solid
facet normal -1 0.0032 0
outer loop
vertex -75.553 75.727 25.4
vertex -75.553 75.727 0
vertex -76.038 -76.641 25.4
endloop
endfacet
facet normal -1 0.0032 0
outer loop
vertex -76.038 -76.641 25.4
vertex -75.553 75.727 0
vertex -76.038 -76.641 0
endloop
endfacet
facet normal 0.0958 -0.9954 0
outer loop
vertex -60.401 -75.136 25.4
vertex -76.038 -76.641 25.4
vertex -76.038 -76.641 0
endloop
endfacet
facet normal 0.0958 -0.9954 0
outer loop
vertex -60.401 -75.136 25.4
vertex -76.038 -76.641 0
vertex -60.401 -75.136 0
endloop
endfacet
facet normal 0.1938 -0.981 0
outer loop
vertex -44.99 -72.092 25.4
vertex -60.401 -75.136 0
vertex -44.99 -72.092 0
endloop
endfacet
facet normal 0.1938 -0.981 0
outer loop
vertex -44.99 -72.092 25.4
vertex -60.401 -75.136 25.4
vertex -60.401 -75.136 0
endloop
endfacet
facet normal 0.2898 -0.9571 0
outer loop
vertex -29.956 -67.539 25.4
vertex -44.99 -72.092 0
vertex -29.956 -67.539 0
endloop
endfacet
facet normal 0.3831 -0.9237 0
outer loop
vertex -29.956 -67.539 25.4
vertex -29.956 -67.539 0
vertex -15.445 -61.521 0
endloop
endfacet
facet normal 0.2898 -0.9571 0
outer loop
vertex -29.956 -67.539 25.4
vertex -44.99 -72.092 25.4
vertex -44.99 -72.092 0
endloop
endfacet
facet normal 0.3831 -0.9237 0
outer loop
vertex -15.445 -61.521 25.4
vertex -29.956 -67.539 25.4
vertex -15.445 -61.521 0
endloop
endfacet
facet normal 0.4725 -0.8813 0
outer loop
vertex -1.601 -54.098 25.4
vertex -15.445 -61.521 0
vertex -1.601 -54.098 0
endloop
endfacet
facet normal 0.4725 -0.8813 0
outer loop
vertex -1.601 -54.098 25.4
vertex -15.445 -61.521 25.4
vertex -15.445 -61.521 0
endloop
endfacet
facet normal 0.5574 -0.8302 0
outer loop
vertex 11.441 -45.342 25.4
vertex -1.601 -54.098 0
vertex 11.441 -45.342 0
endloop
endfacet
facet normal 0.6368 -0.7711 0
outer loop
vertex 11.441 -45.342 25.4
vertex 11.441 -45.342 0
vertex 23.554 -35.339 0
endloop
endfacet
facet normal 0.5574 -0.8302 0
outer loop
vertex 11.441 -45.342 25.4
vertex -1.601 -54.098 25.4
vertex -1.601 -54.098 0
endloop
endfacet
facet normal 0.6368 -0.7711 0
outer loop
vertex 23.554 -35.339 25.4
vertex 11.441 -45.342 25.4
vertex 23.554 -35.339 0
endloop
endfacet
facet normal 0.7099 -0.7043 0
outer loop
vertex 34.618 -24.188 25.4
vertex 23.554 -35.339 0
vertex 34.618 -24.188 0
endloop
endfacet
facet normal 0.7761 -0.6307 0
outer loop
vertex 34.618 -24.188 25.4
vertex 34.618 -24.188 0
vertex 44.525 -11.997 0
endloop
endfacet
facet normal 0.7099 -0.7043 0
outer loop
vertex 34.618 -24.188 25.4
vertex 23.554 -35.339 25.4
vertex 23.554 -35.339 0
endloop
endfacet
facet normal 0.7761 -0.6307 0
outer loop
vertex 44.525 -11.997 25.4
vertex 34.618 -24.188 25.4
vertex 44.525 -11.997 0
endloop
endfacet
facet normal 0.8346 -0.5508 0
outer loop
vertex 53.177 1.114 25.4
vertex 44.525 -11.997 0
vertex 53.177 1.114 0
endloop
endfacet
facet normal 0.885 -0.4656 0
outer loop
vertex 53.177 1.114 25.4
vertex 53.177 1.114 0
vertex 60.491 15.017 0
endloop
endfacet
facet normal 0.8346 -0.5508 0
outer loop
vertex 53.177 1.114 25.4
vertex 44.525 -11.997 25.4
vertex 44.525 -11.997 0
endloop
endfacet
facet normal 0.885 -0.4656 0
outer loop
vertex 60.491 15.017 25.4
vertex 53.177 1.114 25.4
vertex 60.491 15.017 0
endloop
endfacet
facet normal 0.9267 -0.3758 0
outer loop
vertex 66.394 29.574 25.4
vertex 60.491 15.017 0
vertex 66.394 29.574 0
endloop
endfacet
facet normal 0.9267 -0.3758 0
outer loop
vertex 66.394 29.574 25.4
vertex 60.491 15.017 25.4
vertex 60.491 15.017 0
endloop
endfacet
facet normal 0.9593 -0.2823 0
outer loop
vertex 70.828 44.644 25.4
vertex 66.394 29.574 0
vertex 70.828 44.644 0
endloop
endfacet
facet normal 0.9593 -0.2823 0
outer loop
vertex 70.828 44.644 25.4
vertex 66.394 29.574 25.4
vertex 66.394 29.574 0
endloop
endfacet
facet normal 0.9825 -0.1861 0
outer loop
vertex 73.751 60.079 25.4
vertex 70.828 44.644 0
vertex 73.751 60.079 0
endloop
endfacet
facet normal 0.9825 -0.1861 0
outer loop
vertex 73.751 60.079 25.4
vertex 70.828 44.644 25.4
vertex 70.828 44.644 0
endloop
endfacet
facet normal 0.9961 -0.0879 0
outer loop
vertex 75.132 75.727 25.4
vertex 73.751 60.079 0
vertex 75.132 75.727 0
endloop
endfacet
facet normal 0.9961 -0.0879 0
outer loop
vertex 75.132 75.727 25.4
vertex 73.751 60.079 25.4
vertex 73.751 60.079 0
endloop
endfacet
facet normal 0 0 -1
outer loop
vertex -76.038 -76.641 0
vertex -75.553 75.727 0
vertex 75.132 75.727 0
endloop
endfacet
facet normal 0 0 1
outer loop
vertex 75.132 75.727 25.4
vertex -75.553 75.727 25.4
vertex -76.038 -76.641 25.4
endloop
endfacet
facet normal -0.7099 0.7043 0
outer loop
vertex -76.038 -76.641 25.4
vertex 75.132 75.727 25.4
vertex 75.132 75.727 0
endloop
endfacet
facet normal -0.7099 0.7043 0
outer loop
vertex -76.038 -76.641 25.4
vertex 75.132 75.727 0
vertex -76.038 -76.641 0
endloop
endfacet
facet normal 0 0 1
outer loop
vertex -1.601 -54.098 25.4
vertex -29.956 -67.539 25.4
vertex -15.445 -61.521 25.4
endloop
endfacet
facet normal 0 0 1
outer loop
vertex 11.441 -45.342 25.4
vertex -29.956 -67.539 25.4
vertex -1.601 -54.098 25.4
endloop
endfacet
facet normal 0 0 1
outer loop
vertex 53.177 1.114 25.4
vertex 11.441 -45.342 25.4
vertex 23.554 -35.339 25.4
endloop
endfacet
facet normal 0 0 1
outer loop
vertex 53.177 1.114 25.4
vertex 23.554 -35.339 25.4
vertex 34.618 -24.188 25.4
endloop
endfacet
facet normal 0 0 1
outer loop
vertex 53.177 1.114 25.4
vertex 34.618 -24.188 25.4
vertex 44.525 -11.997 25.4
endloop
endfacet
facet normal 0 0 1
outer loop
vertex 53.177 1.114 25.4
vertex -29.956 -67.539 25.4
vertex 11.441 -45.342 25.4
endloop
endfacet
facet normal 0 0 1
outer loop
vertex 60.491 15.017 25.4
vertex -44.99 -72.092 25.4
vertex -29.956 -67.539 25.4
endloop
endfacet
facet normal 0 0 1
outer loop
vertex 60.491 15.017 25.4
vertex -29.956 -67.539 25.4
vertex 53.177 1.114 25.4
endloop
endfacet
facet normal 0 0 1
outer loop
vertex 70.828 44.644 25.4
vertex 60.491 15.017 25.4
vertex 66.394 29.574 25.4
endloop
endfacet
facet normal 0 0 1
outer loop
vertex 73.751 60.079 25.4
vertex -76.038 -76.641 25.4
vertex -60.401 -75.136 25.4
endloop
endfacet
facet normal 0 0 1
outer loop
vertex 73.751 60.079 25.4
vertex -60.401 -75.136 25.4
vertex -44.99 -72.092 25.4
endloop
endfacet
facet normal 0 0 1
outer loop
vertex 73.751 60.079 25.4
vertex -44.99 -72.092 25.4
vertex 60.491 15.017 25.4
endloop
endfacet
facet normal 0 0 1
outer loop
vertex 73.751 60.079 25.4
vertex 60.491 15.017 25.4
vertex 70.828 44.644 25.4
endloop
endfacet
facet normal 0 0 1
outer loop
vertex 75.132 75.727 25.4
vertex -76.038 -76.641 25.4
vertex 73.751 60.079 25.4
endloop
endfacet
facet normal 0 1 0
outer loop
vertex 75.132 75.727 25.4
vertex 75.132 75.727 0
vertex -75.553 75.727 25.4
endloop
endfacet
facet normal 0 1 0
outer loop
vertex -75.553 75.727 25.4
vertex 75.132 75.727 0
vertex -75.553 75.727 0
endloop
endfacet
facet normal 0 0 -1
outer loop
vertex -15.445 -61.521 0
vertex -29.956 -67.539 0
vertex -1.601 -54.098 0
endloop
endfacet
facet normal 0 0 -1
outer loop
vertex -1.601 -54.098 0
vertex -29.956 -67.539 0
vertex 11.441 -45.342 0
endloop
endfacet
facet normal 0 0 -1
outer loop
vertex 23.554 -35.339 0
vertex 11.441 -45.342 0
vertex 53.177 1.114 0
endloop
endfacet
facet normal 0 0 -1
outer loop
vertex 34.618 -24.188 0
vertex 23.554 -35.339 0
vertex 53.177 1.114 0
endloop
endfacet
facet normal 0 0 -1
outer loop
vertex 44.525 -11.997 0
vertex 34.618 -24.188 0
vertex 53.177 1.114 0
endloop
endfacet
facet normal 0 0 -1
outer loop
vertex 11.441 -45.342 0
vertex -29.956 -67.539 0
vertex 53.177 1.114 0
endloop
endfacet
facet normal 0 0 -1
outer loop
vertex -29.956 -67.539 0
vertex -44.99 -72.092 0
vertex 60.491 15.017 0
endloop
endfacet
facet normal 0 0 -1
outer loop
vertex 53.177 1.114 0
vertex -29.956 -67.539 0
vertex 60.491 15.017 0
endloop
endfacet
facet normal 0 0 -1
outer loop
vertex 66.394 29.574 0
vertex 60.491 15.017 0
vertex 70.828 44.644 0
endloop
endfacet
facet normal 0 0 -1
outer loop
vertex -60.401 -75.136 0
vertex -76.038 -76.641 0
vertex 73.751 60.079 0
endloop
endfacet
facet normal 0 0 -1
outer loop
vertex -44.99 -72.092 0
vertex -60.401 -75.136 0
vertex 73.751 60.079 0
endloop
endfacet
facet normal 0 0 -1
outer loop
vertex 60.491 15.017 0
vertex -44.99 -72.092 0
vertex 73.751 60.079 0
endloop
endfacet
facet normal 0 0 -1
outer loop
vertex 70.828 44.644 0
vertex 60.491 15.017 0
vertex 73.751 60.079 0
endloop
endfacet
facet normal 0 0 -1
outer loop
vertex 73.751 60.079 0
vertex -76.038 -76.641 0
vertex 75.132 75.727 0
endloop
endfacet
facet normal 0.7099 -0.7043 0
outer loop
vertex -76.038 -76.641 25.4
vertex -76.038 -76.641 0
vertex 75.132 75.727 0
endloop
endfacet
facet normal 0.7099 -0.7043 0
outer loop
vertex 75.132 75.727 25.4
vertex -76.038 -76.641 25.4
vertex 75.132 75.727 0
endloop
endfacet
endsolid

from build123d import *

# Parameters (mm, degrees)
F2_DEPTH = 25.4
F4_DEPTH = 25.4


with BuildPart() as f2:
    # F1 (on face) → F2 (new body)
    with BuildSketch(Plane.XY):
        Polygon((-76.03763, -76.641098), (75.132422, 75.726502), (-75.553134, 75.726502), align=None)
    extrude(amount=F2_DEPTH)


with BuildPart() as f4:
    # F3 (on face) → F4 (new body)
    with BuildSketch(Plane.XY.offset(25.4)):
        with BuildLine():
            Line((75.132422, 75.726502), (-76.03763, -76.641098))
            ThreePointArc((-76.03763, -76.641098), (29.224016, -29.900673), (75.132422, 75.726502))
        make_face()
    extrude(amount=-F4_DEPTH)


solid = Compound([f2.part, f4.part])
